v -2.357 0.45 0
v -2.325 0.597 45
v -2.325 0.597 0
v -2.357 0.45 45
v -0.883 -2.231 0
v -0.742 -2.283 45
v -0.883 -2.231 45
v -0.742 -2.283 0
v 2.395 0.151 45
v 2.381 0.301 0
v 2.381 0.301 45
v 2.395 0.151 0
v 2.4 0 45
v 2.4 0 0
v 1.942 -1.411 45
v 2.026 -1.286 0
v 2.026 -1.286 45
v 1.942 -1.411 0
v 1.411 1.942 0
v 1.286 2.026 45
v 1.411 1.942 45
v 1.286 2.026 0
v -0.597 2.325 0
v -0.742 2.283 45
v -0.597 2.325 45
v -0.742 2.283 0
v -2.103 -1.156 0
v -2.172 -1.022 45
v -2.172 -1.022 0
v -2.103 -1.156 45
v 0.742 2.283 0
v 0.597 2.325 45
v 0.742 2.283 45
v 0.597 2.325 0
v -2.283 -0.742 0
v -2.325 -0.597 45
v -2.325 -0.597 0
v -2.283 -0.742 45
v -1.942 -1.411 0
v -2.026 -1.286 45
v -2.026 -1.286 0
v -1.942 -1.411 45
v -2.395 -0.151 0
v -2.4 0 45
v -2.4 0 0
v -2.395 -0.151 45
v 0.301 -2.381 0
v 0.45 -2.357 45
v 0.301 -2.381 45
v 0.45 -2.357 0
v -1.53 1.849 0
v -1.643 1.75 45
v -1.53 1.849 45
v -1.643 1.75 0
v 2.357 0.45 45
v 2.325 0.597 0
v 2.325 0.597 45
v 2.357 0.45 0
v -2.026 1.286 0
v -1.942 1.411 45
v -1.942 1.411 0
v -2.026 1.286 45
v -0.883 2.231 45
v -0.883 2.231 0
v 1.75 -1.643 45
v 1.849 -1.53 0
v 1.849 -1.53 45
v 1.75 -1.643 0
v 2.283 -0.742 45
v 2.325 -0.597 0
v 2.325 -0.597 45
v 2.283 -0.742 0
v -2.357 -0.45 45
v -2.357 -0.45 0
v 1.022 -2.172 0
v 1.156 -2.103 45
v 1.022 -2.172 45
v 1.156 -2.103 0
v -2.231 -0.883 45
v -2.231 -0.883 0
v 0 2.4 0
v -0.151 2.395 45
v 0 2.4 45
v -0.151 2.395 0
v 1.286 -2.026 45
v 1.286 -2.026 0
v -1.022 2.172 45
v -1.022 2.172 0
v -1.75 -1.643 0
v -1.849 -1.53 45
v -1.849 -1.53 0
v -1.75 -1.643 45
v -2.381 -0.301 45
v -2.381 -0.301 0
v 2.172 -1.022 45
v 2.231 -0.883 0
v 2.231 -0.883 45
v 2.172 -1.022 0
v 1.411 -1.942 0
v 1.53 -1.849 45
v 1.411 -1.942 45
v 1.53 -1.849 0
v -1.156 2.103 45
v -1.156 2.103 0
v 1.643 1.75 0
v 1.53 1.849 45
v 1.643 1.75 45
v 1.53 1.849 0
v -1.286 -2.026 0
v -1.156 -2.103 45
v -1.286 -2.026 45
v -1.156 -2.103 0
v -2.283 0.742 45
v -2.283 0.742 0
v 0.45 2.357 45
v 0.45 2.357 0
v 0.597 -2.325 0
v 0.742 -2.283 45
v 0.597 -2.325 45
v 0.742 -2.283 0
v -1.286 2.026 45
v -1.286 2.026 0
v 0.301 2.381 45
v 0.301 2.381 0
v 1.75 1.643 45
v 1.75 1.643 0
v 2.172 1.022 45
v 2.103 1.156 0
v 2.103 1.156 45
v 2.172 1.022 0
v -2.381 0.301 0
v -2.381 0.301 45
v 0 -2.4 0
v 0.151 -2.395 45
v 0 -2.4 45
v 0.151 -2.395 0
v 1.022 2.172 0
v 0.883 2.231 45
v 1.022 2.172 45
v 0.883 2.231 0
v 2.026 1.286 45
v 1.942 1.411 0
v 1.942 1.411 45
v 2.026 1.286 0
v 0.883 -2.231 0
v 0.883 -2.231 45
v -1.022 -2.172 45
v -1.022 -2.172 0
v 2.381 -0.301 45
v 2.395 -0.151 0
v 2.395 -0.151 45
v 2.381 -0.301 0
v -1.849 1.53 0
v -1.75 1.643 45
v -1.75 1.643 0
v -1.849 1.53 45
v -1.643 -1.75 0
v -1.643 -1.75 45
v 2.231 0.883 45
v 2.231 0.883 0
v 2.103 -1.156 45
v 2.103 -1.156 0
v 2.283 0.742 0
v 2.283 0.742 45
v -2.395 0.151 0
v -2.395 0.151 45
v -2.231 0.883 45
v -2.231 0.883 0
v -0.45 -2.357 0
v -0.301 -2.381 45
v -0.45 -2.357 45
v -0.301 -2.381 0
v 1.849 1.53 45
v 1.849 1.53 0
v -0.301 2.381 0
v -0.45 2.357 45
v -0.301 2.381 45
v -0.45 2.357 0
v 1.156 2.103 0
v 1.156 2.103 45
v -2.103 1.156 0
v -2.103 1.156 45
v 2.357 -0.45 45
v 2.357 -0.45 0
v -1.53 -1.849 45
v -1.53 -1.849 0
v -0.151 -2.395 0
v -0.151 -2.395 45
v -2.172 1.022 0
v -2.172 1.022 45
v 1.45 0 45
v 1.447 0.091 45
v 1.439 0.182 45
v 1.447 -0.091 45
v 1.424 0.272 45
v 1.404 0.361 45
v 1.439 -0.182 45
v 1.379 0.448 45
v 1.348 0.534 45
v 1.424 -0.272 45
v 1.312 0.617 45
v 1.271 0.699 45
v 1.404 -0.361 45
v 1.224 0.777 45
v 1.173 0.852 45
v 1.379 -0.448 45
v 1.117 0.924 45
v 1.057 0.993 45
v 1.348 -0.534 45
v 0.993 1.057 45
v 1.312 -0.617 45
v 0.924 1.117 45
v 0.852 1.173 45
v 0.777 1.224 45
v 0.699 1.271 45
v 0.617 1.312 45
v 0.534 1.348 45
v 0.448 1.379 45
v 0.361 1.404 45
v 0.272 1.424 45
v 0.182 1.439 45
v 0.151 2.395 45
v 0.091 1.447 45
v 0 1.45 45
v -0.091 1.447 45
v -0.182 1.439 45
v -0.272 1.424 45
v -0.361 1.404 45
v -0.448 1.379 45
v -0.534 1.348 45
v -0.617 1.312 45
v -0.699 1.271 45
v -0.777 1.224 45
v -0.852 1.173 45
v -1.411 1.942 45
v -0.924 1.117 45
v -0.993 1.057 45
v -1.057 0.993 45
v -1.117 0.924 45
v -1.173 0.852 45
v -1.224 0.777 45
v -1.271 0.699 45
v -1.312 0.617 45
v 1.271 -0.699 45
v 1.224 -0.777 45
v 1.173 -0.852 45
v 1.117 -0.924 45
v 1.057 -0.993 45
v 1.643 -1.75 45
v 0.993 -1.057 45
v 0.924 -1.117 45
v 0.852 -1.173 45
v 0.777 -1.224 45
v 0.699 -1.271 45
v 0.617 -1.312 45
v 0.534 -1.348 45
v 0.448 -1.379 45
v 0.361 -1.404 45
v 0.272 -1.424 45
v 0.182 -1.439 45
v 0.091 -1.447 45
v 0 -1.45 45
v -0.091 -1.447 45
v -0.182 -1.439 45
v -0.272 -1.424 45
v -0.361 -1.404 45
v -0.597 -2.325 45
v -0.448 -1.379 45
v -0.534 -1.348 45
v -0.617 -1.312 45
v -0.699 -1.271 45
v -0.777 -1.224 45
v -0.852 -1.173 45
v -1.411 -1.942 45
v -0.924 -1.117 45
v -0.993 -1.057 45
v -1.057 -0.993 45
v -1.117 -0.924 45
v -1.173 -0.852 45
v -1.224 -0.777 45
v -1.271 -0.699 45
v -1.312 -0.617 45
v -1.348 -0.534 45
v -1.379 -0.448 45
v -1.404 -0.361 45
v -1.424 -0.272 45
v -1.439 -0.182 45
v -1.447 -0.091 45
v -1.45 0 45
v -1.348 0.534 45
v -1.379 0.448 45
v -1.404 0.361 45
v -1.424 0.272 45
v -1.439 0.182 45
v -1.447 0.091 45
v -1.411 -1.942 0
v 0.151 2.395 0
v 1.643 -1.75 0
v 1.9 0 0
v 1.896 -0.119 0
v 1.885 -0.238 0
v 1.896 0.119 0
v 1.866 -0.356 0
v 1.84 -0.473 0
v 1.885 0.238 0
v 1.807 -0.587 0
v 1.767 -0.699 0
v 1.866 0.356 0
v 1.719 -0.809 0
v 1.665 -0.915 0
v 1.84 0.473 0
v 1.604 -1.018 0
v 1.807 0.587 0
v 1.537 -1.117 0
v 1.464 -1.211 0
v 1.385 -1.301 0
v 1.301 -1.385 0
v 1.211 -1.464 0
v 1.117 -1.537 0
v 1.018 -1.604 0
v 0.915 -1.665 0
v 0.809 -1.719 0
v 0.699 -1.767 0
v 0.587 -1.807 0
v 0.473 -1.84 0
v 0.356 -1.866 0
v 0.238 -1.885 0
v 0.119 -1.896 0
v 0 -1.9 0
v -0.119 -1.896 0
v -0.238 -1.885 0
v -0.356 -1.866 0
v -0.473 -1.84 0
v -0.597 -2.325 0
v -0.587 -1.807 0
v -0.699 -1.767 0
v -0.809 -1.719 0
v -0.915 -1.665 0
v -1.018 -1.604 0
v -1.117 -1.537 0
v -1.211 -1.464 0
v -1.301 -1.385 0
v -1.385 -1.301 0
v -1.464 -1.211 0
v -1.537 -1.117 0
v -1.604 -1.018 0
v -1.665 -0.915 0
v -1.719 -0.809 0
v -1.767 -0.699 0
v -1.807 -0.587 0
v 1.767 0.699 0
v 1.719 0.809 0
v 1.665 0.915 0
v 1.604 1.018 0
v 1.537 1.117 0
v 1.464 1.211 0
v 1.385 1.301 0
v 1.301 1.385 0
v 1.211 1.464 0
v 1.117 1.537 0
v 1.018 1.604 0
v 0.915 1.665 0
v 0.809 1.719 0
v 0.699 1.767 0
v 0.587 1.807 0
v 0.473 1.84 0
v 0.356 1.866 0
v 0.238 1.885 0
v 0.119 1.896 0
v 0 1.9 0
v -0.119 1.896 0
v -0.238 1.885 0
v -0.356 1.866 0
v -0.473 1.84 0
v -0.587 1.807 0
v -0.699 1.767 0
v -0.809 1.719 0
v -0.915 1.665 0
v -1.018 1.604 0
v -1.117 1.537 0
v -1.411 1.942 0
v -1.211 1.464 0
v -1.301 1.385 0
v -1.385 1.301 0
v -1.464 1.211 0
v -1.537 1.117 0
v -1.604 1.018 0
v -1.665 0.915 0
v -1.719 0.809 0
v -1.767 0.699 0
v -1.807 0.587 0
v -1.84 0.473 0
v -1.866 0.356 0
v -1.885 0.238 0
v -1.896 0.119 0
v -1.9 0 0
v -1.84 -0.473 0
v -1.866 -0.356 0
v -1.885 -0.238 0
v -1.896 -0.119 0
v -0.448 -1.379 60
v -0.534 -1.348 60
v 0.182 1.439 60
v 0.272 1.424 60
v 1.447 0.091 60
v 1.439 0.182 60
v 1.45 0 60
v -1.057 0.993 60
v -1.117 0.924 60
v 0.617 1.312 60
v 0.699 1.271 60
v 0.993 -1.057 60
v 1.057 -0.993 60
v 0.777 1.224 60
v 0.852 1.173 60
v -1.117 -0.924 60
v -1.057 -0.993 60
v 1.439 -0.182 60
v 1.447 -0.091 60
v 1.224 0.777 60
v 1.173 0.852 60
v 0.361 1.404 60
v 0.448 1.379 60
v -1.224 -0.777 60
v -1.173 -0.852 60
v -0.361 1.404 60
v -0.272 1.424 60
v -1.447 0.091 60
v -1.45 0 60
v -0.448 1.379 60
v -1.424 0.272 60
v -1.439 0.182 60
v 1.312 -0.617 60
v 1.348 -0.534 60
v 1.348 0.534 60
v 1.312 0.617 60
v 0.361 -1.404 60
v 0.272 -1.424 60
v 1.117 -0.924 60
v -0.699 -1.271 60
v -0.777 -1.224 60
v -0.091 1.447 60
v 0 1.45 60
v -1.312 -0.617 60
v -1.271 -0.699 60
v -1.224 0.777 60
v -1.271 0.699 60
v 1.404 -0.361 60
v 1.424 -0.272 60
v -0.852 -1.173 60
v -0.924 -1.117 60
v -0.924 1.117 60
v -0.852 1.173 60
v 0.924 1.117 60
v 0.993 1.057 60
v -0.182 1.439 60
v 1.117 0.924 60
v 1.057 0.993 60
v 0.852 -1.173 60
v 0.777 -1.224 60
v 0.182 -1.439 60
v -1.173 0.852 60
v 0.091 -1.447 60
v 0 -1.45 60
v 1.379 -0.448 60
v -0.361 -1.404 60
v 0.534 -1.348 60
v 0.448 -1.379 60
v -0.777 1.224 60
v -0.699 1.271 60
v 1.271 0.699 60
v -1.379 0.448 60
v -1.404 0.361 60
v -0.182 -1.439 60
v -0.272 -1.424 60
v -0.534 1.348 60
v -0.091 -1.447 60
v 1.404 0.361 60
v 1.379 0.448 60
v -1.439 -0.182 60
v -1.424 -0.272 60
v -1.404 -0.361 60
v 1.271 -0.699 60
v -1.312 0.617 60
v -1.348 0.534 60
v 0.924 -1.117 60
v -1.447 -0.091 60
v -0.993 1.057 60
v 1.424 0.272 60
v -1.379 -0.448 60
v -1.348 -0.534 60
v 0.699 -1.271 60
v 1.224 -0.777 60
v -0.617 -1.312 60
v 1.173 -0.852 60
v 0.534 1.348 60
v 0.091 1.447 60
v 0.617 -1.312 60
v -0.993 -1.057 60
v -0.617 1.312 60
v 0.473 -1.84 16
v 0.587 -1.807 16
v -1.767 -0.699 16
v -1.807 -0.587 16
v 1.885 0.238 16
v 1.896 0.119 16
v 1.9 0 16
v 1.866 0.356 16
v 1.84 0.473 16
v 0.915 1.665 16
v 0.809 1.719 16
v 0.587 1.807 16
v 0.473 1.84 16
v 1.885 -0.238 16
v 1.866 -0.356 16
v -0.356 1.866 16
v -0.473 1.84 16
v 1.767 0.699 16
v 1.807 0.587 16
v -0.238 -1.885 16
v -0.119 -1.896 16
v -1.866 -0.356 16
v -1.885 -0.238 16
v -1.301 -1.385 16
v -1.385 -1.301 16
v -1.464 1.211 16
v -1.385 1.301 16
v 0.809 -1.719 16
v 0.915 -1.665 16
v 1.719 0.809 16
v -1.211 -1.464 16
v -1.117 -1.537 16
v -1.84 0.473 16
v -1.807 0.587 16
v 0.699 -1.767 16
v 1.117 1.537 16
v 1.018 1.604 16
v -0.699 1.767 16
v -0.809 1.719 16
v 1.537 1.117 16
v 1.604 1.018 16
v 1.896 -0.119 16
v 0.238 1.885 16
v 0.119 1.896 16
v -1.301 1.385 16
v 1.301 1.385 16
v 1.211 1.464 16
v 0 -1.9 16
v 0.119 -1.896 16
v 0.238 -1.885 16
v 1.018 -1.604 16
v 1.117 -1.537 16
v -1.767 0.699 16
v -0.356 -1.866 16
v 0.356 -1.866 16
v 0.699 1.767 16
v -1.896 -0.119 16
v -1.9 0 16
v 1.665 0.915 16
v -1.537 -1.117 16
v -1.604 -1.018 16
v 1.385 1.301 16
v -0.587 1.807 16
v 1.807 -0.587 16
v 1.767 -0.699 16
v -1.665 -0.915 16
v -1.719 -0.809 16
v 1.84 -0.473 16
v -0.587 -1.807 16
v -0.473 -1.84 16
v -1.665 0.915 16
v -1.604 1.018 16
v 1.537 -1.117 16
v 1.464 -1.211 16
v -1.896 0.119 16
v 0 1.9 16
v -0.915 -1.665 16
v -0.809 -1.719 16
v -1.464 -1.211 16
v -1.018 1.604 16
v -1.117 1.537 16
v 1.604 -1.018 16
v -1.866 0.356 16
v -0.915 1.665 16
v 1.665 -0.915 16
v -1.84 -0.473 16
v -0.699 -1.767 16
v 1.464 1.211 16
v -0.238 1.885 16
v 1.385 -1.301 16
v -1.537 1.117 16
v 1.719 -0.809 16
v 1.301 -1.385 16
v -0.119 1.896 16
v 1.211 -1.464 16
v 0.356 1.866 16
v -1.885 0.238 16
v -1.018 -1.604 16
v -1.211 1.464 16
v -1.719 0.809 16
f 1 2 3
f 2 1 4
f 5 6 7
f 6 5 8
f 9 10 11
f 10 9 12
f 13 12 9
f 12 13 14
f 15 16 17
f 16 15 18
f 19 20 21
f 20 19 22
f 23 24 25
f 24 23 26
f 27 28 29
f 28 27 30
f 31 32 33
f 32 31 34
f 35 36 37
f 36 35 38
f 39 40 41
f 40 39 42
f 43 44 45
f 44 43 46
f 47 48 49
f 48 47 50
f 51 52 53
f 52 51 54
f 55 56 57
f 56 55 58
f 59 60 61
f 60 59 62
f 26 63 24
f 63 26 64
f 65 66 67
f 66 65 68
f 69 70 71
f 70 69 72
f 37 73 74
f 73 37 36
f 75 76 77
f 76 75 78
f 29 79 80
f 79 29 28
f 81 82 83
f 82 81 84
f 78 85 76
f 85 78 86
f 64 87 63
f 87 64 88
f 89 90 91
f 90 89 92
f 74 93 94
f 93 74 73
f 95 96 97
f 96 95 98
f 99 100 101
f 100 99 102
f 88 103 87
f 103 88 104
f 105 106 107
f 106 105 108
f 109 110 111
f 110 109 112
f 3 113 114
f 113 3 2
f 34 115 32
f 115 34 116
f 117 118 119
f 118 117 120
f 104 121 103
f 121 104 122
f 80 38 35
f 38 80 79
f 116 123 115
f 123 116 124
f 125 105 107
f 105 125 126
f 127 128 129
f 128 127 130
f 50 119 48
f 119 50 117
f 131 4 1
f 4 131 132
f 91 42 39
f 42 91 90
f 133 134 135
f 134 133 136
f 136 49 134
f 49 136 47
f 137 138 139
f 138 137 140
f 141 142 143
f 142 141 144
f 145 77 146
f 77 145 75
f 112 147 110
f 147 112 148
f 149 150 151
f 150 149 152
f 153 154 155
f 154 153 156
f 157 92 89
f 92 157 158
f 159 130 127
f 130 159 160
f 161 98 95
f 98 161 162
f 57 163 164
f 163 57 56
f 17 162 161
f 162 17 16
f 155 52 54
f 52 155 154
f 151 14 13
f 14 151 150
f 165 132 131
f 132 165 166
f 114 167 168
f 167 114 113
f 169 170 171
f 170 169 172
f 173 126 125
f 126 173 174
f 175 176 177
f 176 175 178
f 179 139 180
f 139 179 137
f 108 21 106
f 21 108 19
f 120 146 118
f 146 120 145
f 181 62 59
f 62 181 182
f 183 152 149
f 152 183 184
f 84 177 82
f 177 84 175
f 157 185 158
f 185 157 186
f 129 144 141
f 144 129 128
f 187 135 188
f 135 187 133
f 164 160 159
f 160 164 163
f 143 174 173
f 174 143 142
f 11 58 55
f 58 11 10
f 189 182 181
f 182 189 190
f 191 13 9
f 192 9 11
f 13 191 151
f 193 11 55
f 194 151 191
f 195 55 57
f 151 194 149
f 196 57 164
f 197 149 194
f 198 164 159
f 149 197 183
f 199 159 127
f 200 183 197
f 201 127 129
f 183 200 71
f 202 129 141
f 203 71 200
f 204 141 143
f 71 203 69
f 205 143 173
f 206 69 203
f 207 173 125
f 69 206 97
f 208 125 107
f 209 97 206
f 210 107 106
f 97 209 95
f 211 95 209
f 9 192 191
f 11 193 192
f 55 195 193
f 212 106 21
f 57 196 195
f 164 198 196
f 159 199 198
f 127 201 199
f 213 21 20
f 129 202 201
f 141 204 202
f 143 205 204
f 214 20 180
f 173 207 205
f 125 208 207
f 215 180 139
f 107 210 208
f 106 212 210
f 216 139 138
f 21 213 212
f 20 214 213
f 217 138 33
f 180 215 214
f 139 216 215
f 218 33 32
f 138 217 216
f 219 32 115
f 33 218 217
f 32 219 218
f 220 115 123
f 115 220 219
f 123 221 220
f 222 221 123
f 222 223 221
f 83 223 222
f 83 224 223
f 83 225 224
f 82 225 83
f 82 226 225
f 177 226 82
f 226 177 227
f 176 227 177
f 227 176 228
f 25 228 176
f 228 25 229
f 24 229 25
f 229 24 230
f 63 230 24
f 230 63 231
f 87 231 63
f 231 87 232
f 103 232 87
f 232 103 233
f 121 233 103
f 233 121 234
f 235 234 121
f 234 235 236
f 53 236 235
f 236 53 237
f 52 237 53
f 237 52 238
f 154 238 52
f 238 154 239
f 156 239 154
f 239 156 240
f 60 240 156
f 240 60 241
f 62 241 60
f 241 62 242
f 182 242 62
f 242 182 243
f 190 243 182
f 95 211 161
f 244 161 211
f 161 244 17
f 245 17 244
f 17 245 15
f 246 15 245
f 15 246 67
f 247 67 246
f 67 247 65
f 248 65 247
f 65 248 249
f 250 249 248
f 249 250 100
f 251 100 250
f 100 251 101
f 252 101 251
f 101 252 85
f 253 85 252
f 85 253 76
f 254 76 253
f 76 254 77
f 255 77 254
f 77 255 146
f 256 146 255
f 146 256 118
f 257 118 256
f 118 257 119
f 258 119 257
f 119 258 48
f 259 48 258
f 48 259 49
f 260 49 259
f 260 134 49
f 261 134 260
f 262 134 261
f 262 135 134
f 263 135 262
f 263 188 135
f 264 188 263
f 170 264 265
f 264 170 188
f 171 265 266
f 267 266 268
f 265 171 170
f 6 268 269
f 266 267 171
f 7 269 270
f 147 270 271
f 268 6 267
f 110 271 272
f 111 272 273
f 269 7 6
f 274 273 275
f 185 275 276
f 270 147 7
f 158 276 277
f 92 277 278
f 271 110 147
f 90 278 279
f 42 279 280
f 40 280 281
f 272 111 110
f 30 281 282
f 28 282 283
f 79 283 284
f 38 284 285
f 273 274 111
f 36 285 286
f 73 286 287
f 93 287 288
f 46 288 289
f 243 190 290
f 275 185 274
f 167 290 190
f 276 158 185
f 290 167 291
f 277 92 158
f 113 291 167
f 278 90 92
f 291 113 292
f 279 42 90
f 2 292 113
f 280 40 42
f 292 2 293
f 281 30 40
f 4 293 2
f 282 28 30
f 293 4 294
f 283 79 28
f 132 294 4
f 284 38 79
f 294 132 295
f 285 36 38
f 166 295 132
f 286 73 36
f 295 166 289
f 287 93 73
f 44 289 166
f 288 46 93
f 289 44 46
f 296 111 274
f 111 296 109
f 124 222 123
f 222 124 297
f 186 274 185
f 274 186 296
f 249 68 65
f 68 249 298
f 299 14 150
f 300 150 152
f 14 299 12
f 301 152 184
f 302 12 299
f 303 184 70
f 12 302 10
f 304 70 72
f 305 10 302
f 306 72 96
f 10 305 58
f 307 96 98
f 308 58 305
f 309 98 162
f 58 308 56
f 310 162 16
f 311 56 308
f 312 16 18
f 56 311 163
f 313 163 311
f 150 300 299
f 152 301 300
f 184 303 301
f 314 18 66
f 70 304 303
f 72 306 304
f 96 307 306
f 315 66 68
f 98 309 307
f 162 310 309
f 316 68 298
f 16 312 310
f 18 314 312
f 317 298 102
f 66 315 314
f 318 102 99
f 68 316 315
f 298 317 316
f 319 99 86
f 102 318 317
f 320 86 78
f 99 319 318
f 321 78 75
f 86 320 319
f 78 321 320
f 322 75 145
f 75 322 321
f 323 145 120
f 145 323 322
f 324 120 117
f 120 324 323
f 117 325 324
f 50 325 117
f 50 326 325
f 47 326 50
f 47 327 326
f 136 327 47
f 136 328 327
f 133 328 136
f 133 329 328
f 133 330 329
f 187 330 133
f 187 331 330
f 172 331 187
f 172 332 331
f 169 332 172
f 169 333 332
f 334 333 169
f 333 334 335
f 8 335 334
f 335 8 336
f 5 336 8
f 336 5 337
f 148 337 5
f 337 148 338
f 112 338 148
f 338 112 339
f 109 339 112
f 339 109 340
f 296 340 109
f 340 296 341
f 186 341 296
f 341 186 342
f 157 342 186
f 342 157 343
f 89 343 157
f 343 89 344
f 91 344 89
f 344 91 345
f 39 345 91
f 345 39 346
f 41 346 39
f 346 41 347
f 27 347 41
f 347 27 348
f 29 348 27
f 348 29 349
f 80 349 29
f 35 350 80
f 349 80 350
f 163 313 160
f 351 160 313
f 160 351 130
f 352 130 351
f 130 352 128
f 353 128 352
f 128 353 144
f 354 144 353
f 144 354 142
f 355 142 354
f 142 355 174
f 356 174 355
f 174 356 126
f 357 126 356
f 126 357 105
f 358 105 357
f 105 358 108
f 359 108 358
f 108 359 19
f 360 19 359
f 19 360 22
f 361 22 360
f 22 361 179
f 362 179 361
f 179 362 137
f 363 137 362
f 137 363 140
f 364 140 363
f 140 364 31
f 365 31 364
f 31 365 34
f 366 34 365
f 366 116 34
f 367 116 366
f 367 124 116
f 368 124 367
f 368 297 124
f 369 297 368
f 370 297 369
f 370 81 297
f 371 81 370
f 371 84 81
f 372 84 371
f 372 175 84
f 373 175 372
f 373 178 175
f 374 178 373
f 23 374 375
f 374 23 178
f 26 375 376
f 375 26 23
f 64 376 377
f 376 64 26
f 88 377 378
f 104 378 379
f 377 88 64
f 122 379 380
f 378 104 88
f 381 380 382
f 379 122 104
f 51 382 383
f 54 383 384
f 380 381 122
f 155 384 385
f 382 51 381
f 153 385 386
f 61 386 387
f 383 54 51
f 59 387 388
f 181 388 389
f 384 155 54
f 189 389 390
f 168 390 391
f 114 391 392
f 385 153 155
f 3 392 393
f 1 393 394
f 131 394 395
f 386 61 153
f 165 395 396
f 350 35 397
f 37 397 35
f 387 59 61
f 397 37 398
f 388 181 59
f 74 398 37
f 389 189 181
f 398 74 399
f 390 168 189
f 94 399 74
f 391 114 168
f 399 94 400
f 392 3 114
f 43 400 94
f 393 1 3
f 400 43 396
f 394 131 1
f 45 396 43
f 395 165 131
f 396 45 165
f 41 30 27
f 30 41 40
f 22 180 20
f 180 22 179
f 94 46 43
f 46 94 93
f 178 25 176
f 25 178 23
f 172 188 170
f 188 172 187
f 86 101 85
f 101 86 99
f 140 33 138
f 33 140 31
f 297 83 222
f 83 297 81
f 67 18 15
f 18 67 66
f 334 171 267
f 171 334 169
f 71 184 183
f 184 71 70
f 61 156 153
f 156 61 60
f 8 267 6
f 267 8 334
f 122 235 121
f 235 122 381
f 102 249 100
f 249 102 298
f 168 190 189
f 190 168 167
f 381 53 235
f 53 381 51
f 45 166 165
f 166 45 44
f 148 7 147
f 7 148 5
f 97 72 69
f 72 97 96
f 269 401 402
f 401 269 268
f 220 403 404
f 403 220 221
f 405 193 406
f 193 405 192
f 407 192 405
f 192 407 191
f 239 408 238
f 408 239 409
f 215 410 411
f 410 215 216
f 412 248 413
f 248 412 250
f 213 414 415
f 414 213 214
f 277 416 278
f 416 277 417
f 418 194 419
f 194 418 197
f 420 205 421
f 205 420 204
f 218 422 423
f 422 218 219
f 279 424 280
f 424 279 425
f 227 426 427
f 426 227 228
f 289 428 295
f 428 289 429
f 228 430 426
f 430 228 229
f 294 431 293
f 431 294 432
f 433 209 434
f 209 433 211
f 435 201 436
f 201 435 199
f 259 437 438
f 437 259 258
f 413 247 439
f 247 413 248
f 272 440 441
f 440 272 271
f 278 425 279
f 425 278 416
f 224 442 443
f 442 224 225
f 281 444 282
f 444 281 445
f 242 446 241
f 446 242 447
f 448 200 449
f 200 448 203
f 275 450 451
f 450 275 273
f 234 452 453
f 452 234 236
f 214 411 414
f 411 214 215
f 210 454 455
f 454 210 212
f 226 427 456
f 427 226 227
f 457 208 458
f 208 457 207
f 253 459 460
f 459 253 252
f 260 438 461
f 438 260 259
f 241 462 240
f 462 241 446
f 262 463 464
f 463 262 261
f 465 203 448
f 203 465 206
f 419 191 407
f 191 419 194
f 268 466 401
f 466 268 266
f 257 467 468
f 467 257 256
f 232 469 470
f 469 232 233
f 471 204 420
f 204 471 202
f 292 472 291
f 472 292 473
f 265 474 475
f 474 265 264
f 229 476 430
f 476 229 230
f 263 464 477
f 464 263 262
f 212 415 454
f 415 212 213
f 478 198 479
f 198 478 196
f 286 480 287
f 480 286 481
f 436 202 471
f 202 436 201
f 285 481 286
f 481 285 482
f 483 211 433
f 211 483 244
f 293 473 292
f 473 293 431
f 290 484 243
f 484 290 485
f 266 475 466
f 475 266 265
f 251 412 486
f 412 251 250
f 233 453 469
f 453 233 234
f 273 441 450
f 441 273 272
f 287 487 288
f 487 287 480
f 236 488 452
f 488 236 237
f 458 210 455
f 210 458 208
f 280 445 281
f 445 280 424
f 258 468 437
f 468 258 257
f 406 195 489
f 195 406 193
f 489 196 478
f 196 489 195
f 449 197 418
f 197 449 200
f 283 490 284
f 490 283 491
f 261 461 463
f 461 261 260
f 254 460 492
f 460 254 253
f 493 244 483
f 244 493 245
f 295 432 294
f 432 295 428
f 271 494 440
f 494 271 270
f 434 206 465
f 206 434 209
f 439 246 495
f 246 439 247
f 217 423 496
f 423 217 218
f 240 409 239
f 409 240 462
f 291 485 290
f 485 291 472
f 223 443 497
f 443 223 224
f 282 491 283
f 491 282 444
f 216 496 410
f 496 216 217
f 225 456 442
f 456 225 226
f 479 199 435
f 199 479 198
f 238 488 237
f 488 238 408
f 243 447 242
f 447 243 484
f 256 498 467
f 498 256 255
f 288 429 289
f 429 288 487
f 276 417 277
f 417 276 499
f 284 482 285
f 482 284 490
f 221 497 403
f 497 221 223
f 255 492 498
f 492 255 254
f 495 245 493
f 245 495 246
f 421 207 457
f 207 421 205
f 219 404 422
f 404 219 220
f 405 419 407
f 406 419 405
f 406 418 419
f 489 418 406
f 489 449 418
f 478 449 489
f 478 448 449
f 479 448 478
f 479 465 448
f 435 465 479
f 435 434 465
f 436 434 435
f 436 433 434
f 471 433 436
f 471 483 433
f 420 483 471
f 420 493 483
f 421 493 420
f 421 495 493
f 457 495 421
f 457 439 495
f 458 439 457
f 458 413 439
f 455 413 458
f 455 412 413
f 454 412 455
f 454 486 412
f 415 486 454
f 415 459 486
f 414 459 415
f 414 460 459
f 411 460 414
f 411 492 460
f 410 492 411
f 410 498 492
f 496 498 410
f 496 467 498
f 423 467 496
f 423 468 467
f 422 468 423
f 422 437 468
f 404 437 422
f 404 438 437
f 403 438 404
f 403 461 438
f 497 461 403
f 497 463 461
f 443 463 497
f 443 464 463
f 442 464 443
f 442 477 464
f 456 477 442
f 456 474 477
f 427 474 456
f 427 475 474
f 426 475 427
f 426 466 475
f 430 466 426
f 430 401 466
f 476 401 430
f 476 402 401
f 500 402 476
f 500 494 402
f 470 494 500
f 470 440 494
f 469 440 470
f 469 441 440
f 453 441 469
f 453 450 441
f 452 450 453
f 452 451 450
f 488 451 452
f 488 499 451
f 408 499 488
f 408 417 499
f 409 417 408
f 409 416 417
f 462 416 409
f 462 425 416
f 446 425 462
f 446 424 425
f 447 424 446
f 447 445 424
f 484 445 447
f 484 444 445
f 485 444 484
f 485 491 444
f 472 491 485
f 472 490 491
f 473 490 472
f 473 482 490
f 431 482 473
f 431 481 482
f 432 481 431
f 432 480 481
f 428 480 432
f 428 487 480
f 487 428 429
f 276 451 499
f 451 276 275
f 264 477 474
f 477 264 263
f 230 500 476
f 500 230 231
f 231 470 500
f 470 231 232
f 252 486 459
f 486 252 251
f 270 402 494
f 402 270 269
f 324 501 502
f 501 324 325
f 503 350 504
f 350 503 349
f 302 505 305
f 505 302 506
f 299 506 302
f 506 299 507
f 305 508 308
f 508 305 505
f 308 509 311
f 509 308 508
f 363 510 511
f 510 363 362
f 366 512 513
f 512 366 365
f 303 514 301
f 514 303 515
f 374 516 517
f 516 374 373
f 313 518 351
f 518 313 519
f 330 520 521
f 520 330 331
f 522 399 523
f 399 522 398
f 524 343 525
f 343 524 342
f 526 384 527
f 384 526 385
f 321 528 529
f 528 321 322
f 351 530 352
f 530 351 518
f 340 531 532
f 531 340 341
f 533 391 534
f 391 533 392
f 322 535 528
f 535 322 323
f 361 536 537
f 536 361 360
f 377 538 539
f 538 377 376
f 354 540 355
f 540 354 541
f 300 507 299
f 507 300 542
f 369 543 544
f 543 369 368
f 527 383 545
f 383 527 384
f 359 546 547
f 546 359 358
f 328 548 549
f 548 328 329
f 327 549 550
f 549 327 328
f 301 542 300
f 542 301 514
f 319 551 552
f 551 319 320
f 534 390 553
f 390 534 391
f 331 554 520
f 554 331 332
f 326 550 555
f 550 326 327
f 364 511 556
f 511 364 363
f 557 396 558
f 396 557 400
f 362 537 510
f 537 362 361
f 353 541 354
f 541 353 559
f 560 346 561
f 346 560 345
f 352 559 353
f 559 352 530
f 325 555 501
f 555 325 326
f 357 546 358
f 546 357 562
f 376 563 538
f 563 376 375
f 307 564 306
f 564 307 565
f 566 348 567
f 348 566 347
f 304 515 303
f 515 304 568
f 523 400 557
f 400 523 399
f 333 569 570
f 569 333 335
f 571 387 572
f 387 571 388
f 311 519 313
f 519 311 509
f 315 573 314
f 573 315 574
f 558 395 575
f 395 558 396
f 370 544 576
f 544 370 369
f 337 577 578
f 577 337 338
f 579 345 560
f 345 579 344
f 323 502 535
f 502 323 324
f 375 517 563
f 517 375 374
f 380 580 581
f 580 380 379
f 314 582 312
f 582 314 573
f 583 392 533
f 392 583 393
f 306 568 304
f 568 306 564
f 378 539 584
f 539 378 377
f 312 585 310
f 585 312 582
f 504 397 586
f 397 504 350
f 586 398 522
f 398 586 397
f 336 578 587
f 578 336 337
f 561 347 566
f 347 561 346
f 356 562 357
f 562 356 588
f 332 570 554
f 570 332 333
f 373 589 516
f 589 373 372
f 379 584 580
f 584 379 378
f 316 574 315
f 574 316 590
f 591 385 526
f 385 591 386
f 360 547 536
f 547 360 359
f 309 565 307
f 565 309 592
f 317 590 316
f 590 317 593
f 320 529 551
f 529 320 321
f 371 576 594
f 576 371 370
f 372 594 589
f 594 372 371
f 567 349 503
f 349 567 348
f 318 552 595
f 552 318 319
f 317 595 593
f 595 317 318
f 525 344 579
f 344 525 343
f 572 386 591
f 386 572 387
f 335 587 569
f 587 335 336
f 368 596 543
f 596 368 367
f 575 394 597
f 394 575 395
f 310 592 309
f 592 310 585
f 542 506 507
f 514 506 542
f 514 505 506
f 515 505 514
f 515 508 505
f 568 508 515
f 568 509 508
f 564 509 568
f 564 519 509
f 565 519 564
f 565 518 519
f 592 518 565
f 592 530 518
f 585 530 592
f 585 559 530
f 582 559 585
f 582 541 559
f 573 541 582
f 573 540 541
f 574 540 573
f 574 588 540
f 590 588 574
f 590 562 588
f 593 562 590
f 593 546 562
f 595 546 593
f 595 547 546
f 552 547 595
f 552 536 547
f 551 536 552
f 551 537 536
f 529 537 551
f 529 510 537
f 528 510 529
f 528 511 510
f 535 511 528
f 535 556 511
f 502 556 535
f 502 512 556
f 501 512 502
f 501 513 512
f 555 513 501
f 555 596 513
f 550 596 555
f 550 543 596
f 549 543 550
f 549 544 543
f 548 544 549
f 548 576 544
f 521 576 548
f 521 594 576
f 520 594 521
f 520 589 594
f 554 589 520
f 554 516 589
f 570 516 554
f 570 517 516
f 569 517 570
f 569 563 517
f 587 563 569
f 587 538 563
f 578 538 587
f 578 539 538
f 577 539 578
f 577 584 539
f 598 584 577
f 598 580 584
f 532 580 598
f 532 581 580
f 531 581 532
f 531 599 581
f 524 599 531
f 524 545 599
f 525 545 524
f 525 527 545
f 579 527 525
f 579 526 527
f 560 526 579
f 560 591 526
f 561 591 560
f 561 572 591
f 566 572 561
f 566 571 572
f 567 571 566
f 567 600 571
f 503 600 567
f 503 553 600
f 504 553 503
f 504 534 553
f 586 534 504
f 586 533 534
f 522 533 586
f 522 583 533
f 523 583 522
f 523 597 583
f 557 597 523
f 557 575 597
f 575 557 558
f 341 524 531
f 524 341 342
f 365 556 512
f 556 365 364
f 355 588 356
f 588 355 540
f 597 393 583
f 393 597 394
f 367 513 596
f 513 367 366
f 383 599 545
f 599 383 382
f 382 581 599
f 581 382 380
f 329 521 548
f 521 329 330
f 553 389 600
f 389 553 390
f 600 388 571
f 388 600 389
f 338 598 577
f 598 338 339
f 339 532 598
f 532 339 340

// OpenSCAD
difference() {
    color("green") {
        cylinder(45, 2.4, 2.4, $fn = 100);
        translate([0, 0, 45]){cylinder(15, 1.45, 1.45, $fn = 100);}
    }
    translate([0,0,-1]){
        cylinder(17, 1.9, 1.9, $fn = 100);
    }
}
